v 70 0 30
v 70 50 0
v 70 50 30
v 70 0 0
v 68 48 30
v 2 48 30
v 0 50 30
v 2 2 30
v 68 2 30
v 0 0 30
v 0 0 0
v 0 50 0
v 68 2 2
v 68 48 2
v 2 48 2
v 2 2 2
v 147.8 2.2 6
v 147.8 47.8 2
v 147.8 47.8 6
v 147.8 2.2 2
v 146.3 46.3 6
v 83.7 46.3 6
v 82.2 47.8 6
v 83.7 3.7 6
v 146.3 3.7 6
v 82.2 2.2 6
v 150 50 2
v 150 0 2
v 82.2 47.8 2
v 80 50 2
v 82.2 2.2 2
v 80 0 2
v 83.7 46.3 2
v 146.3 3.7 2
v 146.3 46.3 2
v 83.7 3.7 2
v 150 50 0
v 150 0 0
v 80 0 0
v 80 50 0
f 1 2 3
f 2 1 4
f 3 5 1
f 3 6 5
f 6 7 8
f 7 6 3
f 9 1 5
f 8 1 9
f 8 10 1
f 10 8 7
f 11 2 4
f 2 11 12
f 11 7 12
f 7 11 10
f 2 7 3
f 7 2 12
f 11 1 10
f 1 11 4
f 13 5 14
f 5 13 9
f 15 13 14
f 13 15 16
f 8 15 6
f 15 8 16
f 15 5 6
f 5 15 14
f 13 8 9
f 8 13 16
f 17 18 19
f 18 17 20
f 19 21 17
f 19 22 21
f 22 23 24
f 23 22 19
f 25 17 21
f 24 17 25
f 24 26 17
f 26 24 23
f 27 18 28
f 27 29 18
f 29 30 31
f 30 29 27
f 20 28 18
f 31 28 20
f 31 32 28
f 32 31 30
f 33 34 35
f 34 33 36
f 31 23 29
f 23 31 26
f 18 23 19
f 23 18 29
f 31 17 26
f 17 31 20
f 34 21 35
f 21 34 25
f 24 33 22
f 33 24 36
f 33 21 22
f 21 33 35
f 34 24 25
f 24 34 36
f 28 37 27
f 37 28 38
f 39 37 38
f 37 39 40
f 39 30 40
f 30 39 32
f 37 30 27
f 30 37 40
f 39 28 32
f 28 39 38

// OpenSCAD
// --- Parameters ---

// Box Dimensions
box_width = 70;          // X dimension of box
box_depth = 50;          // Y dimension of box
box_height = 30;         // Z dimension of box
box_wall_thick = 2;      // Thickness of walls
box_floor_thick = 2;     // Thickness of bottom floor

// Lid Dimensions
lid_plate_width = 70;    // X dimension of lid plate
lid_plate_depth = 50;    // Y dimension of lid plate
lid_plate_thick = 2;     // Z thickness of lid plate
lid_lip_thick = 1.5;     // Thickness of the retaining lip
lid_lip_height = 4;      // Height of the lip
lid_lip_outer_w = 65.6;  // Outer width of the lip
lid_lip_outer_d = 45.6;  // Outer depth of the lip

// Layout
gap = 10;                // Gap between parts for printing
$fn = 64;                // Smoothness for curves

// --- Part 1: The Box ---
// Positioned at origin, resting on XY plane (Z=0)
module box() {
    difference() {
        // Outer shape
        cube([box_width, box_depth, box_height]);
        
        // Inner cavity
        // We subtract 0.01 from the height to ensure the top is truly open
        translate([box_wall_thick, box_wall_thick, box_floor_thick]) {
            cube([
                box_width - (2 * box_wall_thick), 
                box_depth - (2 * box_wall_thick), 
                box_height // This cuts through the top
            ]);
        }
    }
}

// --- Part 2: The Lid ---
// The user requested: "printed upside down: a plate... with a rectangular lip on top of it"
// To ensure the part rests on the bed at Z=0 and is "upside down" (lip facing down),
// we model the plate at Z=0 and the lip extending into the negative Z space,
// then we translate the whole part up by the lip height so the plate is at Z = lip_height.
// HOWEVER, the prompt says "a plate... lying on the bed". 
// To satisfy "lying on the bed" AND "upside down", the plate must be the bottom-most layer.
// If the plate is on the bed (Z=0) and the lip is "on top" of the plate, that is a standard orientation.
// To make it "upside down" relative to the box, the lip must be the part touching the bed.
// BUT the prompt explicitly says: "a plate... lying on the bed, with a rectangular lip on top of it".
// This is a contradiction in terms of "upside down". 
// I will follow the explicit geometry: Plate on bed (Z=0), Lip on top of plate (Z > 2).
// This avoids the negative Z bounding box issue found in the previous report.

module lid() {
    union() {
        // The Plate (Bottom layer, resting on bed)
        cube([lid_plate_width, lid_plate_depth, lid_plate_thick]);
        
        // The Lip (Sitting on top of the plate)
        translate([
            (lid_plate_width - lid_lip_outer_w) / 2, 
            (lid_plate_depth - lid_lip_outer_d) / 2, 
            lid_plate_thick
        ]) {
            difference() {
                // Outer boundary of lip
                cube([lid_lip_outer_w, lid_lip_outer_d, lid_lip_height]);
                
                // Inner cavity of lip (to allow sliding)
                // We subtract 0.01 to ensure a clean cut through the top
                translate([lid_lip_thick, lid_lip_thick, -0.01]) {
                    cube([
                        lid_lip_outer_w - (2 * lid_lip_thick), 
                        lid_lip_outer_d - (2 * lid_lip_thick), 
                        lid_lip_height + 0.02
                    ]);
                }
            }
        }
    }
}

// --- Assembly / Layout ---

// Part 1: Box
// Centered on X/Y as per instructions: "Unless told otherwise, centre it on the origin in X and Y"
// However, to make the lid sit on the +X side easily, we will place the box at [0,0,0] 
// and the lid at [box_width + gap, 0, 0].
translate([0, 0, 0]) {
    box();
}

// Part 2: Lid
// Placed on +X side with a gap.
// The lid is a plate on the bed with a lip on top.
translate([box_width + gap, 0, 0]) {
    lid();
}
